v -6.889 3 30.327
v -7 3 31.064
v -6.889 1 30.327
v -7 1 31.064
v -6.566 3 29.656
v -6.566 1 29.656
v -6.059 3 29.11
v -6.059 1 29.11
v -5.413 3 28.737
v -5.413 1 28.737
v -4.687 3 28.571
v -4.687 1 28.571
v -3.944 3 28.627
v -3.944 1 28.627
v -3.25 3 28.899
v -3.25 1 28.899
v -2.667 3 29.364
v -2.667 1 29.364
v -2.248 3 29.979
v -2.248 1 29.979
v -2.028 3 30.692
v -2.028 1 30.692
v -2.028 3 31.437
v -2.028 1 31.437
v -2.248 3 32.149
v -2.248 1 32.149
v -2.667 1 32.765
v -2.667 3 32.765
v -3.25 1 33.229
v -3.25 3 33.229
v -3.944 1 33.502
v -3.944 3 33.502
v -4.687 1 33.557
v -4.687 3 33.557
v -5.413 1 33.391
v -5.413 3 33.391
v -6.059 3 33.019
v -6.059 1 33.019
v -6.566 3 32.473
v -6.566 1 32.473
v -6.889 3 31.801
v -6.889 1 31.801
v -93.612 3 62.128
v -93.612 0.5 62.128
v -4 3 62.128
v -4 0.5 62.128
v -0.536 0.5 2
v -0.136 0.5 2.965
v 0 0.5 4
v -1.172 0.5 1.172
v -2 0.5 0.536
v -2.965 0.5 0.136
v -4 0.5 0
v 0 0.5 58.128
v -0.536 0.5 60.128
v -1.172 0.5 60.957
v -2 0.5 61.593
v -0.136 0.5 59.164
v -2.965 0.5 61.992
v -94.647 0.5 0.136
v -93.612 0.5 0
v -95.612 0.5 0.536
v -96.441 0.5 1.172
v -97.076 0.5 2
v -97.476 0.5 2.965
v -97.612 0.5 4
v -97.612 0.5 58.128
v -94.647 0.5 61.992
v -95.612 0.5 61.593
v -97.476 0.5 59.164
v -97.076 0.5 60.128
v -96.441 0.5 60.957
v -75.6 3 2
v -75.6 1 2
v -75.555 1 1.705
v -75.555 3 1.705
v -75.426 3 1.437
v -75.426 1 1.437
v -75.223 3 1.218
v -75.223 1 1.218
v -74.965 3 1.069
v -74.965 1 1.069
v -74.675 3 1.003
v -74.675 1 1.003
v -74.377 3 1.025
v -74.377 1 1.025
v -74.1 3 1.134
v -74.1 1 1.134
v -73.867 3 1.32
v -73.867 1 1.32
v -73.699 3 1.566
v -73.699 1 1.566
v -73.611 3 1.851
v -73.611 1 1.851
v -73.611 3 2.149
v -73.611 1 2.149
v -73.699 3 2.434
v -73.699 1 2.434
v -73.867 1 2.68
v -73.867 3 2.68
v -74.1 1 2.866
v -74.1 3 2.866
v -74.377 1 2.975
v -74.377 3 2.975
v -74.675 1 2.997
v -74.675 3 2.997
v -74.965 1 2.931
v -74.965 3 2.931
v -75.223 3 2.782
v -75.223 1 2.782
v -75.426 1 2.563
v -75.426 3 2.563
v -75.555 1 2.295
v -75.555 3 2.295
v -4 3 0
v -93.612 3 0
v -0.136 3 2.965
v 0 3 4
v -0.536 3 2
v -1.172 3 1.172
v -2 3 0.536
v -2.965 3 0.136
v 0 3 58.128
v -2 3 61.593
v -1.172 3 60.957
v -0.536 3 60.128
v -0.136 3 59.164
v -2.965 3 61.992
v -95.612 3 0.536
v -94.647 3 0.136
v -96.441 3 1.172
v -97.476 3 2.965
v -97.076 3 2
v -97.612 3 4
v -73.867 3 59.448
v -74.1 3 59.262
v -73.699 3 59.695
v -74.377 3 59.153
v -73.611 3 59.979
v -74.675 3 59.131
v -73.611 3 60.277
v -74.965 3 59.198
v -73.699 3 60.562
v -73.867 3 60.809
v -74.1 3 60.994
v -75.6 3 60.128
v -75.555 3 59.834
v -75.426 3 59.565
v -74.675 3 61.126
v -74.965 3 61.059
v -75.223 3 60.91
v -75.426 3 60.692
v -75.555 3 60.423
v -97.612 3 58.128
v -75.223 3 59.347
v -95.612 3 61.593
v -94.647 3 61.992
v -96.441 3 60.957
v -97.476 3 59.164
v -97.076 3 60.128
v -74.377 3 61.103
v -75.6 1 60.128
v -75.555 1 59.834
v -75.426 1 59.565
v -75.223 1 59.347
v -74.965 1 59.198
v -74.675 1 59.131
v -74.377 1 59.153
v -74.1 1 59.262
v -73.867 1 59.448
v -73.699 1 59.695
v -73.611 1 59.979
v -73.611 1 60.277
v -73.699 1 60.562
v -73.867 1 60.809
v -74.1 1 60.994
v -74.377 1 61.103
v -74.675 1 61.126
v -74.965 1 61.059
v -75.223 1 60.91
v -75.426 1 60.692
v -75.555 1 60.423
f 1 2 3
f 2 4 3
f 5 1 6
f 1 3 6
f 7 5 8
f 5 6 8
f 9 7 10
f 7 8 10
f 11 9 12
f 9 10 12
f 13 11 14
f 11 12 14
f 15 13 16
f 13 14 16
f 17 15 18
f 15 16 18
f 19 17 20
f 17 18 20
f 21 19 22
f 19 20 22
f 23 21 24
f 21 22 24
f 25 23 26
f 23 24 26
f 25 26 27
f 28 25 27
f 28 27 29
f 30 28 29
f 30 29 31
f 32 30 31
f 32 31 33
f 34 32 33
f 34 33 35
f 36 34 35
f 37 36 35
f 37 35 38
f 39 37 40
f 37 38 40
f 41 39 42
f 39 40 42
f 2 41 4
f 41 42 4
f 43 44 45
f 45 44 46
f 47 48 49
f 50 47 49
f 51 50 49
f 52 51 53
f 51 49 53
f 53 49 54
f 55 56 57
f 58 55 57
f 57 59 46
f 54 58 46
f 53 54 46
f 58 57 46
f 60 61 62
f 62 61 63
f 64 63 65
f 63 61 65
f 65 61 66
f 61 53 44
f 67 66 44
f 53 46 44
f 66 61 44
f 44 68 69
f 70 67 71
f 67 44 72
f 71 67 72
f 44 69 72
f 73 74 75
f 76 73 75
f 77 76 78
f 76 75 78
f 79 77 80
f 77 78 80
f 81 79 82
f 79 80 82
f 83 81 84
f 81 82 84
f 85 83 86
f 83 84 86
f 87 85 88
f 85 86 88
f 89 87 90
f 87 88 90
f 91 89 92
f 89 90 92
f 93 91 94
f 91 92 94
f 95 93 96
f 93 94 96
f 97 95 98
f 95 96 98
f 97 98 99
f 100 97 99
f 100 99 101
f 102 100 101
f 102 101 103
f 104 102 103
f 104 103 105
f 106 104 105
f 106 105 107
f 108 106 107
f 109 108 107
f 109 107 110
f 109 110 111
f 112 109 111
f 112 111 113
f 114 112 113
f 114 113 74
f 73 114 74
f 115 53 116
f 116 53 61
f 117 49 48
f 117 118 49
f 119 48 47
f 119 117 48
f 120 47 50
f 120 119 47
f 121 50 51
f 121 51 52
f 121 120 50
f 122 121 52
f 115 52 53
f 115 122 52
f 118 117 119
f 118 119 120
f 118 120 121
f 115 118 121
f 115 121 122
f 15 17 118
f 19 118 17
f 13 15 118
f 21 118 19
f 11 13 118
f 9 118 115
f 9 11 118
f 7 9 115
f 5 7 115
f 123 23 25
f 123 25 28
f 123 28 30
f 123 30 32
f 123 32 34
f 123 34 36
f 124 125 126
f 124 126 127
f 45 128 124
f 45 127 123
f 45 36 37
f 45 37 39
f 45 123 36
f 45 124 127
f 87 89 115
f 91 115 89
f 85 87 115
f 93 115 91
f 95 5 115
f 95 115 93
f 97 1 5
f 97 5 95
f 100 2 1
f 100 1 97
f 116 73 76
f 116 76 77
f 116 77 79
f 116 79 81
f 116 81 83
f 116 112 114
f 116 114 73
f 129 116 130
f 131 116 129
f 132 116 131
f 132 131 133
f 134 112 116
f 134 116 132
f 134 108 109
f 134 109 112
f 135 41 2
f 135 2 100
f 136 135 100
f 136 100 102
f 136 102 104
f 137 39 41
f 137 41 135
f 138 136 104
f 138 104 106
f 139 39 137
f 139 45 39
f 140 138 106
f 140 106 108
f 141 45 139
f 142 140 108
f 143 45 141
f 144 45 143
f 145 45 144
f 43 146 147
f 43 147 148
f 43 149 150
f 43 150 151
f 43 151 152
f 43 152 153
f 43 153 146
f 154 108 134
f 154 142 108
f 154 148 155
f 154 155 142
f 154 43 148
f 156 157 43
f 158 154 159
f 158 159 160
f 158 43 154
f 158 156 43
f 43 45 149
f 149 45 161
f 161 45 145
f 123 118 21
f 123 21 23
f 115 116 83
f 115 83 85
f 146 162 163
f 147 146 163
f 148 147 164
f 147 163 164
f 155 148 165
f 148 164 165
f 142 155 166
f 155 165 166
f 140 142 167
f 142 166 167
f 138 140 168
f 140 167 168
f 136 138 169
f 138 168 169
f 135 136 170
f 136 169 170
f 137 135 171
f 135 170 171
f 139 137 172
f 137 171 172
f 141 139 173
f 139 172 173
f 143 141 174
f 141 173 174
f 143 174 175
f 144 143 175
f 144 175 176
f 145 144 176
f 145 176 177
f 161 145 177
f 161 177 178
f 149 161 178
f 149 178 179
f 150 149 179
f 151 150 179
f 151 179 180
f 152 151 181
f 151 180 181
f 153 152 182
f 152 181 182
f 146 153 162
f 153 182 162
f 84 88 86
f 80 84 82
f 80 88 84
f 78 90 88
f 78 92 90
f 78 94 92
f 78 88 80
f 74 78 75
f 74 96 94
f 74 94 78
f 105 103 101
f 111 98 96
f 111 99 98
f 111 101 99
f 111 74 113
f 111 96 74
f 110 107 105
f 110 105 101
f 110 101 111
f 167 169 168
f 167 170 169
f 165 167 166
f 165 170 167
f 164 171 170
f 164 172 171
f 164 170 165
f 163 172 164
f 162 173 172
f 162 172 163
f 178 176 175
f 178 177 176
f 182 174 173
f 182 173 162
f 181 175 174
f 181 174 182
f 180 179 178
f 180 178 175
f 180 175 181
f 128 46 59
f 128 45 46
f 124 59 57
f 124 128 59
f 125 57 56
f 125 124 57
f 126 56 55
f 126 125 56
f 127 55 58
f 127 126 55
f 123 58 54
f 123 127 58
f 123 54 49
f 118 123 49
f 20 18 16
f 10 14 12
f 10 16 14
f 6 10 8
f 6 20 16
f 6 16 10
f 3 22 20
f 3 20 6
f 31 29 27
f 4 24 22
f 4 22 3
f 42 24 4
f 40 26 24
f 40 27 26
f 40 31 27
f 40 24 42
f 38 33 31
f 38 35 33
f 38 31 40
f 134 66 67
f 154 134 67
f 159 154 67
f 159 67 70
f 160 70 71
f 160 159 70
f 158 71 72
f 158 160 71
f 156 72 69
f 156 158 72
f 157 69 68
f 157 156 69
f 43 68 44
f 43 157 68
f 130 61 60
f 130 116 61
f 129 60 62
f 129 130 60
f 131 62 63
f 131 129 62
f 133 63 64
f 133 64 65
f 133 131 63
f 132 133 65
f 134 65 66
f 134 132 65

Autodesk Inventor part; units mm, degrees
ref_plane "YZ Plane" through (0, 0, 0) normal (1, 0, 0) x (0, 1, 0)
ref_plane "XZ Plane" through (0, 0, 0) normal (0, 1, 0) x (-1, 0, 0)
ref_plane "XY Plane" through (0, 0, 0) normal (0, 0, 1) x (1, 0, 0)
sketch "Sketch1" plane through (0, 0, 0) normal (0, 1, 0) x (-1, 0, 0)
  line L0 (0, 0) -> (97.6122, 0)
  line L1 (97.6122, 0) -> (97.6122, 62.1284)
  line L2 (97.6122, 62.1284) -> (0, 62.1284)
  line L3 (0, 62.1284) -> (0, 0)
  line L4 (97.6122, 62.1284) -> (97.6122, 60.1284)
  line L5 (97.6122, 60.1284) -> (74.5998, 60.1284)
  circle A0 centre (74.5998, 60.1284) radius 1
  line L6 (0, 31.0642) -> (4.5, 31.0642)
  circle A1 centre (4.5, 31.0642) radius 2.5
  line L7 (4.5, 31.0642) -> (97.6122, 31.0642)
  circle A2 centre (74.5998, 2) radius 1
  dimension "d0" = 97.6122
  dimension "d1" = 62.1284
  dimension "d2" = 2
  dimension "d3" = 23.0124
  dimension "d4" = 2
  dimension "d5" = 4.5
  dimension "d6" = 5
extrude "Extrusion1" add sketch "Sketch1" along normal blind 3 contours L3 L6 A1 L7 L1 L0 | L3 L2 L1 L7 A1 L6
extrude "Extrusion2" add sketch "Sketch1" along normal blind 1 contours A1 L7 L6 | L6 L7 A1 | A0 | A2
fillet "Fillet1" radius 4 4 edges at (-97.6122, 1.5, 62.1284) (-97.6122, 1.5, 0) (0, 1.5, 0) (0, 1.5, 62.1284)
move faces "Move1" translate (0, 0.5, 0) faces at (-63.7415, 0, 20.7095)
properties part number "magnet card top"
